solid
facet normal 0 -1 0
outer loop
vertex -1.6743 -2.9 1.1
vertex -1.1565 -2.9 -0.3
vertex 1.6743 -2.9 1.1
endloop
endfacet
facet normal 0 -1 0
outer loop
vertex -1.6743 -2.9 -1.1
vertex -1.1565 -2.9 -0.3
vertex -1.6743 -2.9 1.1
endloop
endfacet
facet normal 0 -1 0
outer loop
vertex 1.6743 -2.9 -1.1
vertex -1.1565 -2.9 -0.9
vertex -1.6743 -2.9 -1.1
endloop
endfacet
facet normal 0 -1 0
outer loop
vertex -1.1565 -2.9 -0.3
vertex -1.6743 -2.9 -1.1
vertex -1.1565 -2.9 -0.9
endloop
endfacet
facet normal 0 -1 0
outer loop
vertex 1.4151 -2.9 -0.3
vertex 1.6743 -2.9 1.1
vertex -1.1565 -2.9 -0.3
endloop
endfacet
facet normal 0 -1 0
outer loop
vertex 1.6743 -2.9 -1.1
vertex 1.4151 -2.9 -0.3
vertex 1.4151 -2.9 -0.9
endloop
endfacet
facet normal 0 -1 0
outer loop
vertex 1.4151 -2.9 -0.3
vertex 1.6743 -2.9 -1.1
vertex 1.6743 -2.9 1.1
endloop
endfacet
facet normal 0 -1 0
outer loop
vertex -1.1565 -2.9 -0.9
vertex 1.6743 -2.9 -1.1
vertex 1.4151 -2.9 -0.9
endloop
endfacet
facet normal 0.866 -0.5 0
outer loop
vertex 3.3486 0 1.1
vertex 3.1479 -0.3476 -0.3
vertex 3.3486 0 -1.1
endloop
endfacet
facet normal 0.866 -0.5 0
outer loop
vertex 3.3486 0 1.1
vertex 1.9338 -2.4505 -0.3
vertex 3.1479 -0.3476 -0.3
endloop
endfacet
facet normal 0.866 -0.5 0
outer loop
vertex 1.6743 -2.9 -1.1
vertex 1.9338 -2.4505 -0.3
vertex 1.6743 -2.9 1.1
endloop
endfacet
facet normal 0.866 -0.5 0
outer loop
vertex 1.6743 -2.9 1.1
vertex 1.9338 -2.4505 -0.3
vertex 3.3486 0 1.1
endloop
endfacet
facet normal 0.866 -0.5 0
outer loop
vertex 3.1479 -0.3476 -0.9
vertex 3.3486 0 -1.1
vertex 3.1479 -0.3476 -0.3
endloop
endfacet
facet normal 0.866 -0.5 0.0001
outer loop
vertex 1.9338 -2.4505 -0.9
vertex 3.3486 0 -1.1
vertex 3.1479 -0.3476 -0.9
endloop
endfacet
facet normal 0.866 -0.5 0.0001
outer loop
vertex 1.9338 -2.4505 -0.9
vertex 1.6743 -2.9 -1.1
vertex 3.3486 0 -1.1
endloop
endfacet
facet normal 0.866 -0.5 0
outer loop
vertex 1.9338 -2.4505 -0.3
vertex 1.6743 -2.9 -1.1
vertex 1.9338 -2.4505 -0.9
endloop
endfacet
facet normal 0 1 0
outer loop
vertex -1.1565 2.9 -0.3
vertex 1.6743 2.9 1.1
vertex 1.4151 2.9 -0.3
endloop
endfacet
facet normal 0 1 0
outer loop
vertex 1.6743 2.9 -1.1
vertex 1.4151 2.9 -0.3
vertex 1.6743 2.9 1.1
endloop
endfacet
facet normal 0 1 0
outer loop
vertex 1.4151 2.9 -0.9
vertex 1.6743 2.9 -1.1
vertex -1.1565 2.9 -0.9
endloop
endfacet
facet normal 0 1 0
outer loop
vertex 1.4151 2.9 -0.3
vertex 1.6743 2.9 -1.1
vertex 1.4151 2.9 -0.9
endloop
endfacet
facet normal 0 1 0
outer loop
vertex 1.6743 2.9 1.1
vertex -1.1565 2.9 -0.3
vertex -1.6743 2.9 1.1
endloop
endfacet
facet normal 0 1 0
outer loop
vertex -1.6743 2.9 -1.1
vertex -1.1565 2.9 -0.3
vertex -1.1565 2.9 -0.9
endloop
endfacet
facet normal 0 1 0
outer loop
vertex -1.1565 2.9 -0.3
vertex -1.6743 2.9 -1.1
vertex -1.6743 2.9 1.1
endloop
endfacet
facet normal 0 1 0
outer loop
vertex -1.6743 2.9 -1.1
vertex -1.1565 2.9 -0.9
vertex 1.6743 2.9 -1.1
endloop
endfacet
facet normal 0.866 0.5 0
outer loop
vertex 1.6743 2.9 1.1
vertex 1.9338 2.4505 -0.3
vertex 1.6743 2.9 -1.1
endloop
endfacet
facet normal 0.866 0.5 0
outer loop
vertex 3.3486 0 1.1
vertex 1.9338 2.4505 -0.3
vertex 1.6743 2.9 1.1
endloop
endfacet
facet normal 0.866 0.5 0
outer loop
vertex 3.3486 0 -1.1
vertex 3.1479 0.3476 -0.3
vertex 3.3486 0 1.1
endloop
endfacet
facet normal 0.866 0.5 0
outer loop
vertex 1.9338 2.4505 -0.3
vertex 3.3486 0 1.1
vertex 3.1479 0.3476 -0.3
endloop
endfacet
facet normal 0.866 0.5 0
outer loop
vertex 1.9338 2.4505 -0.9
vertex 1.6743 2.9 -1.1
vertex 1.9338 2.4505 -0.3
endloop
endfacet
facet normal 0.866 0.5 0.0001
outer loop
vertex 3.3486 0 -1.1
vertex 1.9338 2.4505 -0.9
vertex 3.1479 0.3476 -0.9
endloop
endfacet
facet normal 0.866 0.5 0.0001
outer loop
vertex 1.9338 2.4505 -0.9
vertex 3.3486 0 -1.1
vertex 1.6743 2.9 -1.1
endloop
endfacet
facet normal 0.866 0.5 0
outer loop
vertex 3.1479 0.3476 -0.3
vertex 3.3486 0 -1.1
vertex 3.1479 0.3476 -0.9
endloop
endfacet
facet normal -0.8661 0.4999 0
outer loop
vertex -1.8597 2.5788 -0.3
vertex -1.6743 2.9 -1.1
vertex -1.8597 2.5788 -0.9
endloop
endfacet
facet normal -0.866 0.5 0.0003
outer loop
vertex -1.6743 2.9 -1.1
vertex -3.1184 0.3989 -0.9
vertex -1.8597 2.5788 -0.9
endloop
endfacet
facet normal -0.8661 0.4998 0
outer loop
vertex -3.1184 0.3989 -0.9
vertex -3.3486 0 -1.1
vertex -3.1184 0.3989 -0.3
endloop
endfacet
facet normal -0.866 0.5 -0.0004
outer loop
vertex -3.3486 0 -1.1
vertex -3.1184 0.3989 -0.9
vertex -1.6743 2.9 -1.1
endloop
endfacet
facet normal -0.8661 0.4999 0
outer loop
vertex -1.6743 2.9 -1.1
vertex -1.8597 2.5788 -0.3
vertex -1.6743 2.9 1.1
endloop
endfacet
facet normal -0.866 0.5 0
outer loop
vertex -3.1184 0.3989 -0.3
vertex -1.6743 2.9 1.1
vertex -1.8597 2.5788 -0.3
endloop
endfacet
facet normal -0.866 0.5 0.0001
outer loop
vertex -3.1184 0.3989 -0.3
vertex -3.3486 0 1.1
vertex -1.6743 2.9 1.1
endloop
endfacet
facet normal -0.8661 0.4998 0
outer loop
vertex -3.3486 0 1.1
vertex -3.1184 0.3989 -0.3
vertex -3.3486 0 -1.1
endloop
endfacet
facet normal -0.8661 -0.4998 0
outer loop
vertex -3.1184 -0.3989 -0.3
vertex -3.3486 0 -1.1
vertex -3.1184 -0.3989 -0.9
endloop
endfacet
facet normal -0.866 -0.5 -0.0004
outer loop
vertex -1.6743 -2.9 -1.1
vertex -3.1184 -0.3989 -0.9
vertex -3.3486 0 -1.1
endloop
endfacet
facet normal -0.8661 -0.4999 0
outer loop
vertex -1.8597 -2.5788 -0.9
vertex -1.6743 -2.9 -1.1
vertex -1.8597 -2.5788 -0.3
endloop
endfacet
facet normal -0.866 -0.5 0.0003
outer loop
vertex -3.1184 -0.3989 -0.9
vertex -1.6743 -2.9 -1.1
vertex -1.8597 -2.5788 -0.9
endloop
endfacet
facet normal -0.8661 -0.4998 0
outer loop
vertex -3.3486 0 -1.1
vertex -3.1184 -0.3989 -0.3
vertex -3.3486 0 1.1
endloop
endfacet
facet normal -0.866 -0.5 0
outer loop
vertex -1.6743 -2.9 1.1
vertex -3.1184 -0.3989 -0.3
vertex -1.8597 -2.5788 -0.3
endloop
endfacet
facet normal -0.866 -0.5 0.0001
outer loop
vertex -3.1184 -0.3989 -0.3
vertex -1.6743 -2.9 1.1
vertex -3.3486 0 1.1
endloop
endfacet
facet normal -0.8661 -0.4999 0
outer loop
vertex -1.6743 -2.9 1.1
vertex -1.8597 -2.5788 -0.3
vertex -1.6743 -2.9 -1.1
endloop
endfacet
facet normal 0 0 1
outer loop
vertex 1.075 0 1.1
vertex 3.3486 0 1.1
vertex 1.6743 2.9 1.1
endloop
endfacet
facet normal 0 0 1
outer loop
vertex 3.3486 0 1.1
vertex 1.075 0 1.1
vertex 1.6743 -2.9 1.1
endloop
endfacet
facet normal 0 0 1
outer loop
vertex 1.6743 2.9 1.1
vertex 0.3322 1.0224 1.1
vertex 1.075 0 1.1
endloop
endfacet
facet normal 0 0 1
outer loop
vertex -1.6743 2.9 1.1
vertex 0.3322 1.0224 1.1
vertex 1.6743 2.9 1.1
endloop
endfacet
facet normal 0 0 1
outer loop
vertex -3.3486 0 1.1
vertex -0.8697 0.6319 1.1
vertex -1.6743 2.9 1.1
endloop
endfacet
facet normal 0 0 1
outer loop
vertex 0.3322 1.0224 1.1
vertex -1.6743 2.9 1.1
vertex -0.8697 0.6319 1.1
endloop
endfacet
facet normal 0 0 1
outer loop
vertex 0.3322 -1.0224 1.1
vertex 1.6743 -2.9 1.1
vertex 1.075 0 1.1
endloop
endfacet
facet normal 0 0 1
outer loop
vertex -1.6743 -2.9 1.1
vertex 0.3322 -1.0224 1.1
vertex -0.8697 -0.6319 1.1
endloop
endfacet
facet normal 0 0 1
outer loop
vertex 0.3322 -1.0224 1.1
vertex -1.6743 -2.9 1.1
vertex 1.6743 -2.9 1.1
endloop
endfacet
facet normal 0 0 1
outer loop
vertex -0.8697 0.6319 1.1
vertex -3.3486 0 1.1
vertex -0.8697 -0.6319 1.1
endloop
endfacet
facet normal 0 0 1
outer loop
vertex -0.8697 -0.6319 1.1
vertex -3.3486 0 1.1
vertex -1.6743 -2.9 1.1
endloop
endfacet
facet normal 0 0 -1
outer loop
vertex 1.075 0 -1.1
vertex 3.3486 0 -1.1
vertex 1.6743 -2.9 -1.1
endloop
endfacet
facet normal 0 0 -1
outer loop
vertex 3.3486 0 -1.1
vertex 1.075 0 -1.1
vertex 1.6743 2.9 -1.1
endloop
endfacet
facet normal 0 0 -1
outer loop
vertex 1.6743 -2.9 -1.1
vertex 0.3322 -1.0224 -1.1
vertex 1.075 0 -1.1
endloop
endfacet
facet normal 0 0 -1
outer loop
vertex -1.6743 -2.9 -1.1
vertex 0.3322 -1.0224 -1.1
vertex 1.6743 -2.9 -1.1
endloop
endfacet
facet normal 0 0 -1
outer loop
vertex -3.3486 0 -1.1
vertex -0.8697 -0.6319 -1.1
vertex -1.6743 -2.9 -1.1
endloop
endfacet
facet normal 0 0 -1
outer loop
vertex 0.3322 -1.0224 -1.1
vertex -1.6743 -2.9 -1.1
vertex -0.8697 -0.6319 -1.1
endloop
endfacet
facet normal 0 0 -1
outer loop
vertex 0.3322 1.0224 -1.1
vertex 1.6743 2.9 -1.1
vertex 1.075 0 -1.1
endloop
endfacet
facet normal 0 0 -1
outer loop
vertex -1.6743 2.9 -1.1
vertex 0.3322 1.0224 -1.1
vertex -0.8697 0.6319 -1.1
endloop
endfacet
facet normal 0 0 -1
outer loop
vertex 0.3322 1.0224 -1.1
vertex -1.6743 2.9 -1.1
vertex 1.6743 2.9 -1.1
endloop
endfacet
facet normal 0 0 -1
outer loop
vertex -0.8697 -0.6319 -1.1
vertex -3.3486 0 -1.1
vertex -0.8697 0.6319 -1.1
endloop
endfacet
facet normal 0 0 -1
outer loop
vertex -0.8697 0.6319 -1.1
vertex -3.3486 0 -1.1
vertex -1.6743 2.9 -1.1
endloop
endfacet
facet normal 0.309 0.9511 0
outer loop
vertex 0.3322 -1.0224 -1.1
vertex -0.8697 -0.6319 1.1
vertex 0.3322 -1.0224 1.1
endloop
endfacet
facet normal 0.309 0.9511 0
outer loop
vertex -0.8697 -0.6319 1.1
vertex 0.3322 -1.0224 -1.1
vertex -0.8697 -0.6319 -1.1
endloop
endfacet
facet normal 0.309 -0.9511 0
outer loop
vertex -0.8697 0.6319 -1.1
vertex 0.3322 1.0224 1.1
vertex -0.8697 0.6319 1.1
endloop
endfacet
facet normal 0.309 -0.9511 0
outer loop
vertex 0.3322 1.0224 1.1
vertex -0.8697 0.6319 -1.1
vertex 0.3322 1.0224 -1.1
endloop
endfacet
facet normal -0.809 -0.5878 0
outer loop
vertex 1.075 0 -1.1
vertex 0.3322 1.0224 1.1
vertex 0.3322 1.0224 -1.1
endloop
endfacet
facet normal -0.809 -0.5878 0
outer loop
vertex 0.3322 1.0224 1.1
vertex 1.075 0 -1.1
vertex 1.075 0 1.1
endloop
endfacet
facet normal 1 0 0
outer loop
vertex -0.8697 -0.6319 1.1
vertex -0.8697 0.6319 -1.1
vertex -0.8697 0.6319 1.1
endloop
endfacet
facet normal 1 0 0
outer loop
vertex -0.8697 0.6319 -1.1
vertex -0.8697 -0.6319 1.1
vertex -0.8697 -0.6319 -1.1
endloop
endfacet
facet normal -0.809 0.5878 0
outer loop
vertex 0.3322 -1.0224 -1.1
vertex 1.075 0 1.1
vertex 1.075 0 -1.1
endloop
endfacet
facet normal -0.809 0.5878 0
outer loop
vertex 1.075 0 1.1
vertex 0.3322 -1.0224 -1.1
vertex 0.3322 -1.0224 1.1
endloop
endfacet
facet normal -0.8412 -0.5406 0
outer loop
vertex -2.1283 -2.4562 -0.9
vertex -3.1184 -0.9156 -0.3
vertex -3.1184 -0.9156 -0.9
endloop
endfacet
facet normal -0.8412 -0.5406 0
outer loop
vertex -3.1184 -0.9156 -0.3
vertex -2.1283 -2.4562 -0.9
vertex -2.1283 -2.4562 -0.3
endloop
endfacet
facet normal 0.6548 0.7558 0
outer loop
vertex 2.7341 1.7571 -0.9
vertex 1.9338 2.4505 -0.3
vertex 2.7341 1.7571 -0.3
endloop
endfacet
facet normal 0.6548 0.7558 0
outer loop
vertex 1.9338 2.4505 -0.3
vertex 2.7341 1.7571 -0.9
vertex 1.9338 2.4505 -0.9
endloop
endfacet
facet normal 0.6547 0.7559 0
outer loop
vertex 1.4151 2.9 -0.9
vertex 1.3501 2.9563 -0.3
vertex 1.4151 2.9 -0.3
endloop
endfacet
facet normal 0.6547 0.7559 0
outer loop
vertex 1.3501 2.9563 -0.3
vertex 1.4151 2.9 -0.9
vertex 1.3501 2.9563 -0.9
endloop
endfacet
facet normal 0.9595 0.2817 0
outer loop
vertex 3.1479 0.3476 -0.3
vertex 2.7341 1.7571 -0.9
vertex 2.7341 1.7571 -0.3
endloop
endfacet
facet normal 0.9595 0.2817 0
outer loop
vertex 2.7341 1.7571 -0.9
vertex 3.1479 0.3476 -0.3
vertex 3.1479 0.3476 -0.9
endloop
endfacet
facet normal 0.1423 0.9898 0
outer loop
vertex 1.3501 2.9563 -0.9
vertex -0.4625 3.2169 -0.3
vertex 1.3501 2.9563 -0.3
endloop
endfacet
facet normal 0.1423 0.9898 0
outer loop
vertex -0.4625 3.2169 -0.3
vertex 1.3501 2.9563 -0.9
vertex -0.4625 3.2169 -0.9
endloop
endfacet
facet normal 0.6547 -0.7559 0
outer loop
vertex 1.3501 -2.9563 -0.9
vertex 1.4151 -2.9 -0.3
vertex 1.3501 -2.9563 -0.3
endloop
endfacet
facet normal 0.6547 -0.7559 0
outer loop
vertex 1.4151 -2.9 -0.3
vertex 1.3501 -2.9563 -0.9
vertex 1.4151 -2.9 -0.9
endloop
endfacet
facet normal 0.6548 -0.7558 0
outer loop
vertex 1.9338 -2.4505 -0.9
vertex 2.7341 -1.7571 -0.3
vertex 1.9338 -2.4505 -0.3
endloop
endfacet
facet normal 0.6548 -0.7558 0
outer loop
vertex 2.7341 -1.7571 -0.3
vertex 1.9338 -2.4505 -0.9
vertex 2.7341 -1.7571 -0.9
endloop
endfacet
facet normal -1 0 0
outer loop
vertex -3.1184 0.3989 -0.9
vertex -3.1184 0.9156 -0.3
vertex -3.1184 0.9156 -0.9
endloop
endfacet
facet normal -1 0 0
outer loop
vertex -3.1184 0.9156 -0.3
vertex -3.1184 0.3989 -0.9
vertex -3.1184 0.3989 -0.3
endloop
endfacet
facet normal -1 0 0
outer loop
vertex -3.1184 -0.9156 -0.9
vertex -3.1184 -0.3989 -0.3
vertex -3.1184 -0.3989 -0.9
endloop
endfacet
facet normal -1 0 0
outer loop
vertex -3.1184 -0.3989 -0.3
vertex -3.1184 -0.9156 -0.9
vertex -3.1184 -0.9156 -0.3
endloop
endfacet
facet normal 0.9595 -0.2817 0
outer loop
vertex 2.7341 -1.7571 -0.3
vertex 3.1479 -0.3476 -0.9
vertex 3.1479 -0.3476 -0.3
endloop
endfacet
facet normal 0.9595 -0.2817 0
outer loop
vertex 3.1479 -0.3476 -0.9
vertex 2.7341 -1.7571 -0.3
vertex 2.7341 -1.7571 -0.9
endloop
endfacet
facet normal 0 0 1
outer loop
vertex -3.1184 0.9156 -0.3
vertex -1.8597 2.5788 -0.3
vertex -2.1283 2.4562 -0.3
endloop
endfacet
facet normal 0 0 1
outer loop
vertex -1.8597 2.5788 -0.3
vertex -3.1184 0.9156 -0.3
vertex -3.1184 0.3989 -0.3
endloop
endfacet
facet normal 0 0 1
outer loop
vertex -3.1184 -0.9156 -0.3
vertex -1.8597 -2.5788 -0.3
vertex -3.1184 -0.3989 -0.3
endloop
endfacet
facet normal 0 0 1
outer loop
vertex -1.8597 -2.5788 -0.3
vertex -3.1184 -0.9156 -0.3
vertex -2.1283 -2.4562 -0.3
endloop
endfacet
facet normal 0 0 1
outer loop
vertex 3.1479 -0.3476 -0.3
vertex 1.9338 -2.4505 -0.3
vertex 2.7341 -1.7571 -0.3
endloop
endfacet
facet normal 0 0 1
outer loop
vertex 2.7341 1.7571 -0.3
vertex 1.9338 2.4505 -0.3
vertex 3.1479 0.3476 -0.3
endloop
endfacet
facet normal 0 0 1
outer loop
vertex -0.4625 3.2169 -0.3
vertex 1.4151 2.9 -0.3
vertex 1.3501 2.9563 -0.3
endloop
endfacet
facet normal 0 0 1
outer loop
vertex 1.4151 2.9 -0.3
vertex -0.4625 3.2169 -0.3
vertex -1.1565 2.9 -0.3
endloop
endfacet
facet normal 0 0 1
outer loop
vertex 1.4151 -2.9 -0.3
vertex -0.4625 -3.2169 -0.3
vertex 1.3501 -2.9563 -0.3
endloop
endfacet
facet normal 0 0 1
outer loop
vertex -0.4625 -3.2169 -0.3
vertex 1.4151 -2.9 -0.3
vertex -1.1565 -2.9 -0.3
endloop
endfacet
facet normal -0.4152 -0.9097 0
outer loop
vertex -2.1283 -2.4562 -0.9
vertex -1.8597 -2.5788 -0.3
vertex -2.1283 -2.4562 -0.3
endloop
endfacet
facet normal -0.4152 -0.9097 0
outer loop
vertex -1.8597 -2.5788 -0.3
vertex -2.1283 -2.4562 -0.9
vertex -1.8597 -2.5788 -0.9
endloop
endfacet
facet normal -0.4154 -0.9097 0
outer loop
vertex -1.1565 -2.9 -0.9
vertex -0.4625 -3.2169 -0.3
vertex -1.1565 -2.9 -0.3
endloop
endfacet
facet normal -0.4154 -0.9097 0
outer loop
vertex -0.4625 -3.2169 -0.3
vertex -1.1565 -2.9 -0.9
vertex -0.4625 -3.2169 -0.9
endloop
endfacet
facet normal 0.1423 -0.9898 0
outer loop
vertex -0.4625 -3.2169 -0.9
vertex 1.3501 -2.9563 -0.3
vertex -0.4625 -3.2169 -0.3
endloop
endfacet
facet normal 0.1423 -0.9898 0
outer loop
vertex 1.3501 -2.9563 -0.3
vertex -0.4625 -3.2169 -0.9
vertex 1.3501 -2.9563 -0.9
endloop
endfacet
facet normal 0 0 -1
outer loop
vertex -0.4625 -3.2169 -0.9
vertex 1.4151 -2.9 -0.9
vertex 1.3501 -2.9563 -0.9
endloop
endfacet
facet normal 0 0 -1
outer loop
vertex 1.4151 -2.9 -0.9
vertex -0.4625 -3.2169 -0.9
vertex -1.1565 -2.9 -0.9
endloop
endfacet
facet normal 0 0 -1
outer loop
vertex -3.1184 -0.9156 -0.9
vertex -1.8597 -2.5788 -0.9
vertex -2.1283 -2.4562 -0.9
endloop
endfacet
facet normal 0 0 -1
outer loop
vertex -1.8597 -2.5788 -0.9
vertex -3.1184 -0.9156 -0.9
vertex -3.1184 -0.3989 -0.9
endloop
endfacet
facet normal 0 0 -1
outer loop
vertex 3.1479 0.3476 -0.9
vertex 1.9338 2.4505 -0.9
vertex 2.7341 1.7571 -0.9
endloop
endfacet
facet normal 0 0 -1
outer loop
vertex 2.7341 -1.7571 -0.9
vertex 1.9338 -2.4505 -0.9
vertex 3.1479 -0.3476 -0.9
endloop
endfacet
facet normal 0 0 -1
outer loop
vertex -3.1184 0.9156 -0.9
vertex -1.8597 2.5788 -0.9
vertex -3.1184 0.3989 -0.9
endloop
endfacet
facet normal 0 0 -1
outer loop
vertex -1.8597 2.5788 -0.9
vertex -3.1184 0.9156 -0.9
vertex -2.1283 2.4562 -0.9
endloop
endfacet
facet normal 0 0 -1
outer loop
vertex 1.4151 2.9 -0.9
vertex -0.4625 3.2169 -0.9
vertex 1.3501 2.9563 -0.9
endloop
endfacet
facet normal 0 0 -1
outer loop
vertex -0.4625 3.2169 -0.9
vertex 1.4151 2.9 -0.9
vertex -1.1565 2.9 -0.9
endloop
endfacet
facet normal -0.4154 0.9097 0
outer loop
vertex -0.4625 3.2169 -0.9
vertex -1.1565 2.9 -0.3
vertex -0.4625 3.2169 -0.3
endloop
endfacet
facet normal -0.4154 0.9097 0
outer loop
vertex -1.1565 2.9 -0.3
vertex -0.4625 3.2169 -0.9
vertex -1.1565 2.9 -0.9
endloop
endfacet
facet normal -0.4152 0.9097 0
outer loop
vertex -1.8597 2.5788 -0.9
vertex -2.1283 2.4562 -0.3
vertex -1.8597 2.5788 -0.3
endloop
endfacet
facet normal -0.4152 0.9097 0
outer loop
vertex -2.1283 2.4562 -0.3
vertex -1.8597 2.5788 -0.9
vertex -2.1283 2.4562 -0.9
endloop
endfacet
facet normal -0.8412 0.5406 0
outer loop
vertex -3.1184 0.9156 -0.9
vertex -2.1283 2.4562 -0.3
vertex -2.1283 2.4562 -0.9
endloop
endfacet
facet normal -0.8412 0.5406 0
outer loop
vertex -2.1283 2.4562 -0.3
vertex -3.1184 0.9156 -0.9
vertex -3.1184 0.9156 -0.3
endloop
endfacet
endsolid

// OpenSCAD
// Parameters
thread_nominal_diameter_mm = 2.5; //[1.25:5:0.01]
thread_pitch_mm = 0.45; //[0.2:0.9:0.01]
across_flats_mm = 5.8; //[2.9:11.6:0.01]
thickness_mm = 2.2; //[1.1:4.4:0.01]
hole_minor_diameter_mm = 2.05; //[1.2:3.2:0.01]
tolerance_mm = 0.1; //[0:0.3:0.01]
top_chamfer_mm = 0.2; //[0:0.6:0.01]
bottom_chamfer_mm = 0.2; //[0:0.6:0.01]
chamfer_radial_mm = 0.25; //[0.05:0.8:0.01]
edge_overlap_mm = 0.8; //[0.5:2:0.01]
washer_outer_diameter_mm = 6.5; //[4:13:0.01]
washer_thickness_mm = 0.6; //[0.3:1.2:0.01]
washer_hole_diameter_mm = 2.7; //[2.2:3.5:0.01]

// Hex Nut - complete geometry
module hex_nut() {
  color("DimGray") {
    difference() {
      // Hexagonal body
      cylinder(h=thickness_mm, r=across_flats_mm/(2*cos(30)), center=true, $fn=6);
      // Central thread hole
      translate([0, 0, 0])
        cylinder(h=thickness_mm + 2*edge_overlap_mm, r=(hole_minor_diameter_mm + tolerance_mm)/2, center=true);
      // Top edge break
      translate([0, 0, thickness_mm/2 - top_chamfer_mm/2 + edge_overlap_mm/2])
        difference() {
          cylinder(h=top_chamfer_mm, r=across_flats_mm/(2*cos(30)) + edge_overlap_mm, center=true);
          cylinder(h=top_chamfer_mm + 2*edge_overlap_mm, r=across_flats_mm/(2*cos(30)) - chamfer_radial_mm, center=true);
        }
      // Bottom edge break
      translate([0, 0, -thickness_mm/2 + bottom_chamfer_mm/2 - edge_overlap_mm/2])
        difference() {
          cylinder(h=bottom_chamfer_mm, r=across_flats_mm/(2*cos(30)) + edge_overlap_mm, center=true);
          cylinder(h=bottom_chamfer_mm + 2*edge_overlap_mm, r=across_flats_mm/(2*cos(30)) - chamfer_radial_mm, center=true);
        }
    }
  }
}

// Washer - complete geometry
module washer() {
  color("Silver") {
    difference() {
      // Outer washer
      translate([0, 0, -(thickness_mm/2 + washer_thickness_mm/2 - edge_overlap_mm)])
        cylinder(h=washer_thickness_mm, r=washer_outer_diameter_mm/2, center=true);
      // Washer hole
      translate([0, 0, -(thickness_mm/2 + washer_thickness_mm/2 - edge_overlap_mm)])
        cylinder(h=washer_thickness_mm + 2*edge_overlap_mm, r=washer_hole_diameter_mm/2, center=true);
    }
  }
}

// Assembly
module assembly() {
  hex_nut();
  washer();
}

assembly();
